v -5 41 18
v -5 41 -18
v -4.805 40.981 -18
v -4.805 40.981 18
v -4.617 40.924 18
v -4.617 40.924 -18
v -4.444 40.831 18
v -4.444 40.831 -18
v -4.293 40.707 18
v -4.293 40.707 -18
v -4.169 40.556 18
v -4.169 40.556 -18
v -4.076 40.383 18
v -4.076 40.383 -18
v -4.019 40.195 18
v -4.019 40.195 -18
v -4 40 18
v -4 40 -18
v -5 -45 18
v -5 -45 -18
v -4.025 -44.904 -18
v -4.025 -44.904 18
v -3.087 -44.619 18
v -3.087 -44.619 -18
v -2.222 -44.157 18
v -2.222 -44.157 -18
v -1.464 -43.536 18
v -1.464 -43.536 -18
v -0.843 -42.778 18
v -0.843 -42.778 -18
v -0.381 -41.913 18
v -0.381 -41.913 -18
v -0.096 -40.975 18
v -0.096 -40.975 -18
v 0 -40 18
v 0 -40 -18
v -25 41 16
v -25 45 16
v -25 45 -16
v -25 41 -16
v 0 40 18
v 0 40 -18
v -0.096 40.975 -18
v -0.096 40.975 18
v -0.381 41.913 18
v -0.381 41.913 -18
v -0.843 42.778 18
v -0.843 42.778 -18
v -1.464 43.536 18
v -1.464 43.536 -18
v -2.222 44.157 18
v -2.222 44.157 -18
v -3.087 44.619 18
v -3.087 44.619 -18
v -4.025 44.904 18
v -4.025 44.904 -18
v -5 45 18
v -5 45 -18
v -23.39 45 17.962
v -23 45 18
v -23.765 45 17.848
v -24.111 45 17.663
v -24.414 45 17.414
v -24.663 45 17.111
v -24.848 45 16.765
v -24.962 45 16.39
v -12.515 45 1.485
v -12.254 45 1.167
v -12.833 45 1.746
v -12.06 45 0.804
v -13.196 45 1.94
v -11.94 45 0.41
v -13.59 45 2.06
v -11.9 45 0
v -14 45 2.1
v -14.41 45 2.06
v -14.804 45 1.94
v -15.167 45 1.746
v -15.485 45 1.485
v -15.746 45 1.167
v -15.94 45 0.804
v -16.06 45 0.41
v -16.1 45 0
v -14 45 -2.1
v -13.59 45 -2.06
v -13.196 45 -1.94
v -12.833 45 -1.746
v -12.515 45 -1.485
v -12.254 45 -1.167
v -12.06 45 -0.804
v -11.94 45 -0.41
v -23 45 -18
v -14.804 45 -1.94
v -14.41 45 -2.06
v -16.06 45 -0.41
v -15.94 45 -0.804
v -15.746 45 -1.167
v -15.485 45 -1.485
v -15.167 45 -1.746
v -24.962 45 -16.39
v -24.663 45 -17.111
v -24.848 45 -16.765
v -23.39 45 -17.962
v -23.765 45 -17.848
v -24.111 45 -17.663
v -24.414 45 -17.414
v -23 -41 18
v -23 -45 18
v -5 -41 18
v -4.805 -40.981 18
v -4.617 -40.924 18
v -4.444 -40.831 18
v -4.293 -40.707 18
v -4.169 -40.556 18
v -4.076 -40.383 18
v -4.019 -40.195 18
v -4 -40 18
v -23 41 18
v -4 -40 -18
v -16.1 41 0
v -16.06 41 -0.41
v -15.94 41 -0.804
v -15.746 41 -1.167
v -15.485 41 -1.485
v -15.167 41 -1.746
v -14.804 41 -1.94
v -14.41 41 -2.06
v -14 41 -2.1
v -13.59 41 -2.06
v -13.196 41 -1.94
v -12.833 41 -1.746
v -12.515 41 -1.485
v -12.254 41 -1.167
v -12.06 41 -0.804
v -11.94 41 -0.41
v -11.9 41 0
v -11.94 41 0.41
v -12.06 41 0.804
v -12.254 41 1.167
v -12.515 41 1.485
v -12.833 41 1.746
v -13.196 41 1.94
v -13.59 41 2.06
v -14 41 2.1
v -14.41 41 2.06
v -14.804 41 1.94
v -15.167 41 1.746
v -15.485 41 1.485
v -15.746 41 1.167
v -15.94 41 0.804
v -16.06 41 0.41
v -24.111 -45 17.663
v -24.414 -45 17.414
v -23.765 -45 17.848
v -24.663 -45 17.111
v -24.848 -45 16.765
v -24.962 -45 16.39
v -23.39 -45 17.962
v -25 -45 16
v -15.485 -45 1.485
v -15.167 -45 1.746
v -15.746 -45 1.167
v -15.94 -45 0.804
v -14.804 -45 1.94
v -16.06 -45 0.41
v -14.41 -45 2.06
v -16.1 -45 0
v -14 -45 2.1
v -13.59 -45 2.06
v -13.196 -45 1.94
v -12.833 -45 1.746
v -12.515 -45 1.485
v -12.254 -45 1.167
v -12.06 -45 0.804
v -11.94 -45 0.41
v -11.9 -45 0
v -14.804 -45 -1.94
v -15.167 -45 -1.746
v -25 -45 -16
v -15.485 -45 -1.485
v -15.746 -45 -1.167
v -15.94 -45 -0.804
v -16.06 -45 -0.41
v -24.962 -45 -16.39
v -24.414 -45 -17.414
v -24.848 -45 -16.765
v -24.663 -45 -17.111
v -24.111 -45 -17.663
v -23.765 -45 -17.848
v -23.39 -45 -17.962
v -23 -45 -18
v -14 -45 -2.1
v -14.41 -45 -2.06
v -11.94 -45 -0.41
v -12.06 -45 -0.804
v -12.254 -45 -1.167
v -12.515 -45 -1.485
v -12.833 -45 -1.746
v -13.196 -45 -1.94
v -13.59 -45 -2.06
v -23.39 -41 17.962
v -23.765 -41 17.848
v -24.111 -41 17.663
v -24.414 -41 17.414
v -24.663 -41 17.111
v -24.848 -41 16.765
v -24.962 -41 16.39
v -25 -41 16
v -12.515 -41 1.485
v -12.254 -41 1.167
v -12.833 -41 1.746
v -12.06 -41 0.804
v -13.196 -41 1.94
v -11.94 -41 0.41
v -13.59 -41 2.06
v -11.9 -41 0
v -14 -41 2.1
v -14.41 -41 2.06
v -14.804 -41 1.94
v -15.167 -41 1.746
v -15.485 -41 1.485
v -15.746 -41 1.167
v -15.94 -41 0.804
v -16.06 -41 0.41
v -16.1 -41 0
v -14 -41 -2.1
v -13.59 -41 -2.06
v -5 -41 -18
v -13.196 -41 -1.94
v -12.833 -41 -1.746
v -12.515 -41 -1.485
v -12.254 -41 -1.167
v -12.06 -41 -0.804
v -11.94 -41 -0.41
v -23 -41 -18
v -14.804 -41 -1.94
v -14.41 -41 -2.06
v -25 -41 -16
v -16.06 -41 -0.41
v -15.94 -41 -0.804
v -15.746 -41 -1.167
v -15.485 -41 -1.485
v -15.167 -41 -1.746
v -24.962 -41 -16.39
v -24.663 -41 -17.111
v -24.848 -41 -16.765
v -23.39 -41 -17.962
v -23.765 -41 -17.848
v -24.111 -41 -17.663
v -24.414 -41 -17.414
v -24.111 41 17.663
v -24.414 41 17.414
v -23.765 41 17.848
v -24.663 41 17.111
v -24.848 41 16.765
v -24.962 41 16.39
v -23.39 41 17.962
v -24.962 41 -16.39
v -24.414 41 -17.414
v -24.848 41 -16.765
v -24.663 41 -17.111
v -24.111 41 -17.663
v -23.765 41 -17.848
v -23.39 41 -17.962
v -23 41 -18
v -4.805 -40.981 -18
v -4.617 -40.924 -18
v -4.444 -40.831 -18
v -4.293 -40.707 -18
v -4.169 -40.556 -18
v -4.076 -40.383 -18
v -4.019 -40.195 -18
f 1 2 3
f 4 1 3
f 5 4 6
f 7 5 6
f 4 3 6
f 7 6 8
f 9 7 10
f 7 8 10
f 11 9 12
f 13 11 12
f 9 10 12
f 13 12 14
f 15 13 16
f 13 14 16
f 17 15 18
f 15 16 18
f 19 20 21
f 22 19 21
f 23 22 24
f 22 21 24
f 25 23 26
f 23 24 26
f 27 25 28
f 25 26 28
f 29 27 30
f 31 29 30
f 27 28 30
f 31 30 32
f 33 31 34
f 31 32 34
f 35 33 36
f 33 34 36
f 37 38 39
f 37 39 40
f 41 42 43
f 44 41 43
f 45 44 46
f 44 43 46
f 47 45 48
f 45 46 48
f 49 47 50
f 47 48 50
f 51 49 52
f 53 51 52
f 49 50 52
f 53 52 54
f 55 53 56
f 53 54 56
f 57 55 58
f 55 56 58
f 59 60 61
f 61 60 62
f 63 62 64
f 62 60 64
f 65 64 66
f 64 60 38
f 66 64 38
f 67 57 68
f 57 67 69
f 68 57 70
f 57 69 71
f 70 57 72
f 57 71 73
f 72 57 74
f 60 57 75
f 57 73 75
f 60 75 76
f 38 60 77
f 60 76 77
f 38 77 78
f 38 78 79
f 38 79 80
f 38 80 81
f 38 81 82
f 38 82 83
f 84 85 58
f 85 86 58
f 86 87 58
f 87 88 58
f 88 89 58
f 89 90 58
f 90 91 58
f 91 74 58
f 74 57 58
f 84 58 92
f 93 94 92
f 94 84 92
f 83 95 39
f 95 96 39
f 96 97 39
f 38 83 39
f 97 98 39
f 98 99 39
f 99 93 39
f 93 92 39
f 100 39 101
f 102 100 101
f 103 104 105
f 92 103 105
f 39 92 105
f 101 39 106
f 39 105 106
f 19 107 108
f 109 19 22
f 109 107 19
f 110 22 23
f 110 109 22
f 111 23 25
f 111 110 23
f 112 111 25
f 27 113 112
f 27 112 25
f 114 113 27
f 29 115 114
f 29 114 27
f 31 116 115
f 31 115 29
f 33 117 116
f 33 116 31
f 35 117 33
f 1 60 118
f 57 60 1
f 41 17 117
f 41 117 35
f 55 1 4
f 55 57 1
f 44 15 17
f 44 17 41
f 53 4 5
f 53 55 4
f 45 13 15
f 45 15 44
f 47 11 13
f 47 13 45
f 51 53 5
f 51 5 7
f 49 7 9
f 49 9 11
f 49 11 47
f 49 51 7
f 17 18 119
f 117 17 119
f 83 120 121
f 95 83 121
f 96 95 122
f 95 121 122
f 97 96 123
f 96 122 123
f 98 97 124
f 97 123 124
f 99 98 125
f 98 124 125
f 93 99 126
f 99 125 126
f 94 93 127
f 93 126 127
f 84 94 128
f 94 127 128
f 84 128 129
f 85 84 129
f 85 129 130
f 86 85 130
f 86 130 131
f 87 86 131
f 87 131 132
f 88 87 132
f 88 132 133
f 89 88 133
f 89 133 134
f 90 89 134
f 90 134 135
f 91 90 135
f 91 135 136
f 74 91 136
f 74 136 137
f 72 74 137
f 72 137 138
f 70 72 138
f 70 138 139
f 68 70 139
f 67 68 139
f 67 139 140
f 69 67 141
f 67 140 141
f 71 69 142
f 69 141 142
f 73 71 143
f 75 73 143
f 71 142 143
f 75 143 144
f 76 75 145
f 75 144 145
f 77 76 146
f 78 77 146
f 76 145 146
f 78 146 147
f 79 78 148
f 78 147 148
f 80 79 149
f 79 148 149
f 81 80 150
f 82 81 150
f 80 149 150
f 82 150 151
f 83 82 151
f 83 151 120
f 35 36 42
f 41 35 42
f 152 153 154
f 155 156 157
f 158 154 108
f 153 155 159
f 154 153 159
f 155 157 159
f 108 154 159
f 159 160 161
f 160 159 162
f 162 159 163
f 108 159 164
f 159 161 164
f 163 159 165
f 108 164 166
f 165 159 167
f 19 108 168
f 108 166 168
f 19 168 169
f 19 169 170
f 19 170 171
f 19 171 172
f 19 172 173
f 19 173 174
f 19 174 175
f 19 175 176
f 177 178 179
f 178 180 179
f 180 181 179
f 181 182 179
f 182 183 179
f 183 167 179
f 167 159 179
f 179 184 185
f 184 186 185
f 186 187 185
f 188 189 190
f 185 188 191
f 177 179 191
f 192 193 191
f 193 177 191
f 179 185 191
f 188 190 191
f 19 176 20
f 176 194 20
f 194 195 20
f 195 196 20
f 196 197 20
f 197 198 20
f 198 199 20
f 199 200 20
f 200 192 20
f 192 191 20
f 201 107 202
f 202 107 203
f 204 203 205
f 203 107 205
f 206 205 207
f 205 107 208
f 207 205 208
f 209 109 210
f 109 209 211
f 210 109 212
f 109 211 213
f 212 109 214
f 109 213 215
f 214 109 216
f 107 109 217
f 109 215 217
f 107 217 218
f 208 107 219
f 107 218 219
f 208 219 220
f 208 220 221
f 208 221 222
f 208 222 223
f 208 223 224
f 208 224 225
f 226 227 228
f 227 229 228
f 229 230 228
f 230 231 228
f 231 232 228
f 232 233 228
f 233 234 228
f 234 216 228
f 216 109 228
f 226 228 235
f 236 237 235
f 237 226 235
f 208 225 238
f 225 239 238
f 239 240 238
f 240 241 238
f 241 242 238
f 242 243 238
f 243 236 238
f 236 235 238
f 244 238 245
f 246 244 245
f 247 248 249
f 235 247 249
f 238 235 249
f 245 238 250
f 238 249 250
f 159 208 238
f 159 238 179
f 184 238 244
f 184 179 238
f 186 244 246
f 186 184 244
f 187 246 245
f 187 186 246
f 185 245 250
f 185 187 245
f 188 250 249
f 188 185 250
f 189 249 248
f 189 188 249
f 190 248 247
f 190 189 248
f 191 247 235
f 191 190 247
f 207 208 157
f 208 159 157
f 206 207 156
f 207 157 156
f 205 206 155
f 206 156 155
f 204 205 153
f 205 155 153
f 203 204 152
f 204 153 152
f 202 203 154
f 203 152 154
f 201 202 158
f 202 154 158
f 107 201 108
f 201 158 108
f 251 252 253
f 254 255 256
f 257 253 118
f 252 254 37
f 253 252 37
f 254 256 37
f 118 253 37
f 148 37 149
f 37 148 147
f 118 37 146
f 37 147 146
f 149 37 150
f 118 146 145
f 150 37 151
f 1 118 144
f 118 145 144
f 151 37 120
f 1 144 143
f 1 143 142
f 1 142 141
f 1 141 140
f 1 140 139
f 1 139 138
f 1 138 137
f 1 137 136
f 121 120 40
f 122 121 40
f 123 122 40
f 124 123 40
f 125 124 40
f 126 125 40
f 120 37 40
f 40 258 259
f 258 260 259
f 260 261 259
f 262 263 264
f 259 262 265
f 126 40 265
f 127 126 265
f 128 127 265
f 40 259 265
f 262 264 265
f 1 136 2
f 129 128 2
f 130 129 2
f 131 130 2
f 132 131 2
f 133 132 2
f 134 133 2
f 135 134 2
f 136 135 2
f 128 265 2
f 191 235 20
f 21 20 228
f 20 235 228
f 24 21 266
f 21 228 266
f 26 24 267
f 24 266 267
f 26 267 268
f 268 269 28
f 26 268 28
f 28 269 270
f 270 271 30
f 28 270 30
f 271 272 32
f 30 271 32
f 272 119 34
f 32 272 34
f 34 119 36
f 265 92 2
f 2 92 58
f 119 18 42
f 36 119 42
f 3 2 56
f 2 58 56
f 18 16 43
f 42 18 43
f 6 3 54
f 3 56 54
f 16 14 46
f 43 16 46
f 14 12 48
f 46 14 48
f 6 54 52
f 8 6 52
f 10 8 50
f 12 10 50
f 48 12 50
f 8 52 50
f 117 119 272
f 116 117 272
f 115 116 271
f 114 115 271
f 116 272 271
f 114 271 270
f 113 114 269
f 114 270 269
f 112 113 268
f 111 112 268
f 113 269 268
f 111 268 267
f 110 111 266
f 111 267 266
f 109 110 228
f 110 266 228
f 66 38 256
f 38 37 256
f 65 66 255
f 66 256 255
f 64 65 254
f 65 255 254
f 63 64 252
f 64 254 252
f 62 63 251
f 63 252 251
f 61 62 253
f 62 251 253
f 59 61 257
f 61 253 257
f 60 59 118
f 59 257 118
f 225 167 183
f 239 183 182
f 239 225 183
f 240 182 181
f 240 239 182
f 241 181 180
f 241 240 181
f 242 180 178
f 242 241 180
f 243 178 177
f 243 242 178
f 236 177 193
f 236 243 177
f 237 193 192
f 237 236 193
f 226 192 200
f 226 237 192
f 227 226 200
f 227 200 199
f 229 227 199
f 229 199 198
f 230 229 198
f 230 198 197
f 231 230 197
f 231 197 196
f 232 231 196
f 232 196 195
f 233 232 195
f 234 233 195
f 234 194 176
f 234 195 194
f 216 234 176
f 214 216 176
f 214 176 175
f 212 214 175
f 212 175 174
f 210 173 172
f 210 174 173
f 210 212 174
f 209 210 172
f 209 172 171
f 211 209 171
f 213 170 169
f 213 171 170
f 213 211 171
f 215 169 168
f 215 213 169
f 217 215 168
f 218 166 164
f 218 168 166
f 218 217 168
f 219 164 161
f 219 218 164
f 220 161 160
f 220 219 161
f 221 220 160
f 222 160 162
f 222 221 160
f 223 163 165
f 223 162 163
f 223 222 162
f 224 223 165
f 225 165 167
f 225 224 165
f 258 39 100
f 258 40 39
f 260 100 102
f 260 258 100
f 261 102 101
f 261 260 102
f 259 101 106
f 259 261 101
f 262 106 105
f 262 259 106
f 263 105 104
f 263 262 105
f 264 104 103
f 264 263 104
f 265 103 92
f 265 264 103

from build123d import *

# Parameters (mm, degrees)
BASE_FLANGE1_START    = -18
BASE_FLANGE1_DEPTH    = 36
FILLET1_R             = 2
M5_TAPPED_HOLE1_D     = 4.2
M5_TAPPED_HOLE1_DEPTH = 4


# Read off the part's stored shape, not the designer's step: Base-Flange1
with BuildPart() as part:
    # Base-Flange1 outline → Base-Flange1 (new body)
    with BuildSketch(Plane.XY.offset(BASE_FLANGE1_START)):
        with BuildLine():
            Line((-5, 45), (-25, 45))
            Line((-25, 45), (-25, 41))
            Line((-25, 41), (-5, 41))
            ThreePointArc((-5, 41), (-4.292893219, 40.707106781), (-4, 40))
            Line((-4, 40), (-4, -40))
            ThreePointArc((-4, -40), (-4.292893219, -40.707106781), (-5, -41))
            Line((-5, -41), (-25, -41))
            Line((-25, -41), (-25, -45))
            Line((-25, -45), (-5, -45))
            ThreePointArc((-5, -45), (-1.464466094, -43.535533906), (0, -40))
            Line((0, -40), (0, 40))
            ThreePointArc((0, 40), (-1.464466094, 43.535533906), (-5, 45))
        make_face()
    extrude(amount=BASE_FLANGE1_DEPTH)

    # Fillet1
    fillet1_edges = [part.edges().sort_by_distance(p)[0] for p in [
        (-25, -43, -18),
        (-25, 43, -18),
        (-25, -43, 18),
        (-25, 43, 18),
    ]]
    fillet(fillet1_edges, radius=FILLET1_R)

    # M5 Tapped Hole1
    with Locations(Plane(origin=(0, 45, 0), x_dir=(1, 0, 0), z_dir=(0, 1, 0))):
        with Locations((-14, 0)):
            m5_tapped_hole1 = Hole(M5_TAPPED_HOLE1_D / 2, depth=M5_TAPPED_HOLE1_DEPTH)

    # Mirror1: M5 Tapped Hole1 across plane
    add(m5_tapped_hole1.mirror(Plane.ZX), mode=Mode.SUBTRACT)


solid = part.part
